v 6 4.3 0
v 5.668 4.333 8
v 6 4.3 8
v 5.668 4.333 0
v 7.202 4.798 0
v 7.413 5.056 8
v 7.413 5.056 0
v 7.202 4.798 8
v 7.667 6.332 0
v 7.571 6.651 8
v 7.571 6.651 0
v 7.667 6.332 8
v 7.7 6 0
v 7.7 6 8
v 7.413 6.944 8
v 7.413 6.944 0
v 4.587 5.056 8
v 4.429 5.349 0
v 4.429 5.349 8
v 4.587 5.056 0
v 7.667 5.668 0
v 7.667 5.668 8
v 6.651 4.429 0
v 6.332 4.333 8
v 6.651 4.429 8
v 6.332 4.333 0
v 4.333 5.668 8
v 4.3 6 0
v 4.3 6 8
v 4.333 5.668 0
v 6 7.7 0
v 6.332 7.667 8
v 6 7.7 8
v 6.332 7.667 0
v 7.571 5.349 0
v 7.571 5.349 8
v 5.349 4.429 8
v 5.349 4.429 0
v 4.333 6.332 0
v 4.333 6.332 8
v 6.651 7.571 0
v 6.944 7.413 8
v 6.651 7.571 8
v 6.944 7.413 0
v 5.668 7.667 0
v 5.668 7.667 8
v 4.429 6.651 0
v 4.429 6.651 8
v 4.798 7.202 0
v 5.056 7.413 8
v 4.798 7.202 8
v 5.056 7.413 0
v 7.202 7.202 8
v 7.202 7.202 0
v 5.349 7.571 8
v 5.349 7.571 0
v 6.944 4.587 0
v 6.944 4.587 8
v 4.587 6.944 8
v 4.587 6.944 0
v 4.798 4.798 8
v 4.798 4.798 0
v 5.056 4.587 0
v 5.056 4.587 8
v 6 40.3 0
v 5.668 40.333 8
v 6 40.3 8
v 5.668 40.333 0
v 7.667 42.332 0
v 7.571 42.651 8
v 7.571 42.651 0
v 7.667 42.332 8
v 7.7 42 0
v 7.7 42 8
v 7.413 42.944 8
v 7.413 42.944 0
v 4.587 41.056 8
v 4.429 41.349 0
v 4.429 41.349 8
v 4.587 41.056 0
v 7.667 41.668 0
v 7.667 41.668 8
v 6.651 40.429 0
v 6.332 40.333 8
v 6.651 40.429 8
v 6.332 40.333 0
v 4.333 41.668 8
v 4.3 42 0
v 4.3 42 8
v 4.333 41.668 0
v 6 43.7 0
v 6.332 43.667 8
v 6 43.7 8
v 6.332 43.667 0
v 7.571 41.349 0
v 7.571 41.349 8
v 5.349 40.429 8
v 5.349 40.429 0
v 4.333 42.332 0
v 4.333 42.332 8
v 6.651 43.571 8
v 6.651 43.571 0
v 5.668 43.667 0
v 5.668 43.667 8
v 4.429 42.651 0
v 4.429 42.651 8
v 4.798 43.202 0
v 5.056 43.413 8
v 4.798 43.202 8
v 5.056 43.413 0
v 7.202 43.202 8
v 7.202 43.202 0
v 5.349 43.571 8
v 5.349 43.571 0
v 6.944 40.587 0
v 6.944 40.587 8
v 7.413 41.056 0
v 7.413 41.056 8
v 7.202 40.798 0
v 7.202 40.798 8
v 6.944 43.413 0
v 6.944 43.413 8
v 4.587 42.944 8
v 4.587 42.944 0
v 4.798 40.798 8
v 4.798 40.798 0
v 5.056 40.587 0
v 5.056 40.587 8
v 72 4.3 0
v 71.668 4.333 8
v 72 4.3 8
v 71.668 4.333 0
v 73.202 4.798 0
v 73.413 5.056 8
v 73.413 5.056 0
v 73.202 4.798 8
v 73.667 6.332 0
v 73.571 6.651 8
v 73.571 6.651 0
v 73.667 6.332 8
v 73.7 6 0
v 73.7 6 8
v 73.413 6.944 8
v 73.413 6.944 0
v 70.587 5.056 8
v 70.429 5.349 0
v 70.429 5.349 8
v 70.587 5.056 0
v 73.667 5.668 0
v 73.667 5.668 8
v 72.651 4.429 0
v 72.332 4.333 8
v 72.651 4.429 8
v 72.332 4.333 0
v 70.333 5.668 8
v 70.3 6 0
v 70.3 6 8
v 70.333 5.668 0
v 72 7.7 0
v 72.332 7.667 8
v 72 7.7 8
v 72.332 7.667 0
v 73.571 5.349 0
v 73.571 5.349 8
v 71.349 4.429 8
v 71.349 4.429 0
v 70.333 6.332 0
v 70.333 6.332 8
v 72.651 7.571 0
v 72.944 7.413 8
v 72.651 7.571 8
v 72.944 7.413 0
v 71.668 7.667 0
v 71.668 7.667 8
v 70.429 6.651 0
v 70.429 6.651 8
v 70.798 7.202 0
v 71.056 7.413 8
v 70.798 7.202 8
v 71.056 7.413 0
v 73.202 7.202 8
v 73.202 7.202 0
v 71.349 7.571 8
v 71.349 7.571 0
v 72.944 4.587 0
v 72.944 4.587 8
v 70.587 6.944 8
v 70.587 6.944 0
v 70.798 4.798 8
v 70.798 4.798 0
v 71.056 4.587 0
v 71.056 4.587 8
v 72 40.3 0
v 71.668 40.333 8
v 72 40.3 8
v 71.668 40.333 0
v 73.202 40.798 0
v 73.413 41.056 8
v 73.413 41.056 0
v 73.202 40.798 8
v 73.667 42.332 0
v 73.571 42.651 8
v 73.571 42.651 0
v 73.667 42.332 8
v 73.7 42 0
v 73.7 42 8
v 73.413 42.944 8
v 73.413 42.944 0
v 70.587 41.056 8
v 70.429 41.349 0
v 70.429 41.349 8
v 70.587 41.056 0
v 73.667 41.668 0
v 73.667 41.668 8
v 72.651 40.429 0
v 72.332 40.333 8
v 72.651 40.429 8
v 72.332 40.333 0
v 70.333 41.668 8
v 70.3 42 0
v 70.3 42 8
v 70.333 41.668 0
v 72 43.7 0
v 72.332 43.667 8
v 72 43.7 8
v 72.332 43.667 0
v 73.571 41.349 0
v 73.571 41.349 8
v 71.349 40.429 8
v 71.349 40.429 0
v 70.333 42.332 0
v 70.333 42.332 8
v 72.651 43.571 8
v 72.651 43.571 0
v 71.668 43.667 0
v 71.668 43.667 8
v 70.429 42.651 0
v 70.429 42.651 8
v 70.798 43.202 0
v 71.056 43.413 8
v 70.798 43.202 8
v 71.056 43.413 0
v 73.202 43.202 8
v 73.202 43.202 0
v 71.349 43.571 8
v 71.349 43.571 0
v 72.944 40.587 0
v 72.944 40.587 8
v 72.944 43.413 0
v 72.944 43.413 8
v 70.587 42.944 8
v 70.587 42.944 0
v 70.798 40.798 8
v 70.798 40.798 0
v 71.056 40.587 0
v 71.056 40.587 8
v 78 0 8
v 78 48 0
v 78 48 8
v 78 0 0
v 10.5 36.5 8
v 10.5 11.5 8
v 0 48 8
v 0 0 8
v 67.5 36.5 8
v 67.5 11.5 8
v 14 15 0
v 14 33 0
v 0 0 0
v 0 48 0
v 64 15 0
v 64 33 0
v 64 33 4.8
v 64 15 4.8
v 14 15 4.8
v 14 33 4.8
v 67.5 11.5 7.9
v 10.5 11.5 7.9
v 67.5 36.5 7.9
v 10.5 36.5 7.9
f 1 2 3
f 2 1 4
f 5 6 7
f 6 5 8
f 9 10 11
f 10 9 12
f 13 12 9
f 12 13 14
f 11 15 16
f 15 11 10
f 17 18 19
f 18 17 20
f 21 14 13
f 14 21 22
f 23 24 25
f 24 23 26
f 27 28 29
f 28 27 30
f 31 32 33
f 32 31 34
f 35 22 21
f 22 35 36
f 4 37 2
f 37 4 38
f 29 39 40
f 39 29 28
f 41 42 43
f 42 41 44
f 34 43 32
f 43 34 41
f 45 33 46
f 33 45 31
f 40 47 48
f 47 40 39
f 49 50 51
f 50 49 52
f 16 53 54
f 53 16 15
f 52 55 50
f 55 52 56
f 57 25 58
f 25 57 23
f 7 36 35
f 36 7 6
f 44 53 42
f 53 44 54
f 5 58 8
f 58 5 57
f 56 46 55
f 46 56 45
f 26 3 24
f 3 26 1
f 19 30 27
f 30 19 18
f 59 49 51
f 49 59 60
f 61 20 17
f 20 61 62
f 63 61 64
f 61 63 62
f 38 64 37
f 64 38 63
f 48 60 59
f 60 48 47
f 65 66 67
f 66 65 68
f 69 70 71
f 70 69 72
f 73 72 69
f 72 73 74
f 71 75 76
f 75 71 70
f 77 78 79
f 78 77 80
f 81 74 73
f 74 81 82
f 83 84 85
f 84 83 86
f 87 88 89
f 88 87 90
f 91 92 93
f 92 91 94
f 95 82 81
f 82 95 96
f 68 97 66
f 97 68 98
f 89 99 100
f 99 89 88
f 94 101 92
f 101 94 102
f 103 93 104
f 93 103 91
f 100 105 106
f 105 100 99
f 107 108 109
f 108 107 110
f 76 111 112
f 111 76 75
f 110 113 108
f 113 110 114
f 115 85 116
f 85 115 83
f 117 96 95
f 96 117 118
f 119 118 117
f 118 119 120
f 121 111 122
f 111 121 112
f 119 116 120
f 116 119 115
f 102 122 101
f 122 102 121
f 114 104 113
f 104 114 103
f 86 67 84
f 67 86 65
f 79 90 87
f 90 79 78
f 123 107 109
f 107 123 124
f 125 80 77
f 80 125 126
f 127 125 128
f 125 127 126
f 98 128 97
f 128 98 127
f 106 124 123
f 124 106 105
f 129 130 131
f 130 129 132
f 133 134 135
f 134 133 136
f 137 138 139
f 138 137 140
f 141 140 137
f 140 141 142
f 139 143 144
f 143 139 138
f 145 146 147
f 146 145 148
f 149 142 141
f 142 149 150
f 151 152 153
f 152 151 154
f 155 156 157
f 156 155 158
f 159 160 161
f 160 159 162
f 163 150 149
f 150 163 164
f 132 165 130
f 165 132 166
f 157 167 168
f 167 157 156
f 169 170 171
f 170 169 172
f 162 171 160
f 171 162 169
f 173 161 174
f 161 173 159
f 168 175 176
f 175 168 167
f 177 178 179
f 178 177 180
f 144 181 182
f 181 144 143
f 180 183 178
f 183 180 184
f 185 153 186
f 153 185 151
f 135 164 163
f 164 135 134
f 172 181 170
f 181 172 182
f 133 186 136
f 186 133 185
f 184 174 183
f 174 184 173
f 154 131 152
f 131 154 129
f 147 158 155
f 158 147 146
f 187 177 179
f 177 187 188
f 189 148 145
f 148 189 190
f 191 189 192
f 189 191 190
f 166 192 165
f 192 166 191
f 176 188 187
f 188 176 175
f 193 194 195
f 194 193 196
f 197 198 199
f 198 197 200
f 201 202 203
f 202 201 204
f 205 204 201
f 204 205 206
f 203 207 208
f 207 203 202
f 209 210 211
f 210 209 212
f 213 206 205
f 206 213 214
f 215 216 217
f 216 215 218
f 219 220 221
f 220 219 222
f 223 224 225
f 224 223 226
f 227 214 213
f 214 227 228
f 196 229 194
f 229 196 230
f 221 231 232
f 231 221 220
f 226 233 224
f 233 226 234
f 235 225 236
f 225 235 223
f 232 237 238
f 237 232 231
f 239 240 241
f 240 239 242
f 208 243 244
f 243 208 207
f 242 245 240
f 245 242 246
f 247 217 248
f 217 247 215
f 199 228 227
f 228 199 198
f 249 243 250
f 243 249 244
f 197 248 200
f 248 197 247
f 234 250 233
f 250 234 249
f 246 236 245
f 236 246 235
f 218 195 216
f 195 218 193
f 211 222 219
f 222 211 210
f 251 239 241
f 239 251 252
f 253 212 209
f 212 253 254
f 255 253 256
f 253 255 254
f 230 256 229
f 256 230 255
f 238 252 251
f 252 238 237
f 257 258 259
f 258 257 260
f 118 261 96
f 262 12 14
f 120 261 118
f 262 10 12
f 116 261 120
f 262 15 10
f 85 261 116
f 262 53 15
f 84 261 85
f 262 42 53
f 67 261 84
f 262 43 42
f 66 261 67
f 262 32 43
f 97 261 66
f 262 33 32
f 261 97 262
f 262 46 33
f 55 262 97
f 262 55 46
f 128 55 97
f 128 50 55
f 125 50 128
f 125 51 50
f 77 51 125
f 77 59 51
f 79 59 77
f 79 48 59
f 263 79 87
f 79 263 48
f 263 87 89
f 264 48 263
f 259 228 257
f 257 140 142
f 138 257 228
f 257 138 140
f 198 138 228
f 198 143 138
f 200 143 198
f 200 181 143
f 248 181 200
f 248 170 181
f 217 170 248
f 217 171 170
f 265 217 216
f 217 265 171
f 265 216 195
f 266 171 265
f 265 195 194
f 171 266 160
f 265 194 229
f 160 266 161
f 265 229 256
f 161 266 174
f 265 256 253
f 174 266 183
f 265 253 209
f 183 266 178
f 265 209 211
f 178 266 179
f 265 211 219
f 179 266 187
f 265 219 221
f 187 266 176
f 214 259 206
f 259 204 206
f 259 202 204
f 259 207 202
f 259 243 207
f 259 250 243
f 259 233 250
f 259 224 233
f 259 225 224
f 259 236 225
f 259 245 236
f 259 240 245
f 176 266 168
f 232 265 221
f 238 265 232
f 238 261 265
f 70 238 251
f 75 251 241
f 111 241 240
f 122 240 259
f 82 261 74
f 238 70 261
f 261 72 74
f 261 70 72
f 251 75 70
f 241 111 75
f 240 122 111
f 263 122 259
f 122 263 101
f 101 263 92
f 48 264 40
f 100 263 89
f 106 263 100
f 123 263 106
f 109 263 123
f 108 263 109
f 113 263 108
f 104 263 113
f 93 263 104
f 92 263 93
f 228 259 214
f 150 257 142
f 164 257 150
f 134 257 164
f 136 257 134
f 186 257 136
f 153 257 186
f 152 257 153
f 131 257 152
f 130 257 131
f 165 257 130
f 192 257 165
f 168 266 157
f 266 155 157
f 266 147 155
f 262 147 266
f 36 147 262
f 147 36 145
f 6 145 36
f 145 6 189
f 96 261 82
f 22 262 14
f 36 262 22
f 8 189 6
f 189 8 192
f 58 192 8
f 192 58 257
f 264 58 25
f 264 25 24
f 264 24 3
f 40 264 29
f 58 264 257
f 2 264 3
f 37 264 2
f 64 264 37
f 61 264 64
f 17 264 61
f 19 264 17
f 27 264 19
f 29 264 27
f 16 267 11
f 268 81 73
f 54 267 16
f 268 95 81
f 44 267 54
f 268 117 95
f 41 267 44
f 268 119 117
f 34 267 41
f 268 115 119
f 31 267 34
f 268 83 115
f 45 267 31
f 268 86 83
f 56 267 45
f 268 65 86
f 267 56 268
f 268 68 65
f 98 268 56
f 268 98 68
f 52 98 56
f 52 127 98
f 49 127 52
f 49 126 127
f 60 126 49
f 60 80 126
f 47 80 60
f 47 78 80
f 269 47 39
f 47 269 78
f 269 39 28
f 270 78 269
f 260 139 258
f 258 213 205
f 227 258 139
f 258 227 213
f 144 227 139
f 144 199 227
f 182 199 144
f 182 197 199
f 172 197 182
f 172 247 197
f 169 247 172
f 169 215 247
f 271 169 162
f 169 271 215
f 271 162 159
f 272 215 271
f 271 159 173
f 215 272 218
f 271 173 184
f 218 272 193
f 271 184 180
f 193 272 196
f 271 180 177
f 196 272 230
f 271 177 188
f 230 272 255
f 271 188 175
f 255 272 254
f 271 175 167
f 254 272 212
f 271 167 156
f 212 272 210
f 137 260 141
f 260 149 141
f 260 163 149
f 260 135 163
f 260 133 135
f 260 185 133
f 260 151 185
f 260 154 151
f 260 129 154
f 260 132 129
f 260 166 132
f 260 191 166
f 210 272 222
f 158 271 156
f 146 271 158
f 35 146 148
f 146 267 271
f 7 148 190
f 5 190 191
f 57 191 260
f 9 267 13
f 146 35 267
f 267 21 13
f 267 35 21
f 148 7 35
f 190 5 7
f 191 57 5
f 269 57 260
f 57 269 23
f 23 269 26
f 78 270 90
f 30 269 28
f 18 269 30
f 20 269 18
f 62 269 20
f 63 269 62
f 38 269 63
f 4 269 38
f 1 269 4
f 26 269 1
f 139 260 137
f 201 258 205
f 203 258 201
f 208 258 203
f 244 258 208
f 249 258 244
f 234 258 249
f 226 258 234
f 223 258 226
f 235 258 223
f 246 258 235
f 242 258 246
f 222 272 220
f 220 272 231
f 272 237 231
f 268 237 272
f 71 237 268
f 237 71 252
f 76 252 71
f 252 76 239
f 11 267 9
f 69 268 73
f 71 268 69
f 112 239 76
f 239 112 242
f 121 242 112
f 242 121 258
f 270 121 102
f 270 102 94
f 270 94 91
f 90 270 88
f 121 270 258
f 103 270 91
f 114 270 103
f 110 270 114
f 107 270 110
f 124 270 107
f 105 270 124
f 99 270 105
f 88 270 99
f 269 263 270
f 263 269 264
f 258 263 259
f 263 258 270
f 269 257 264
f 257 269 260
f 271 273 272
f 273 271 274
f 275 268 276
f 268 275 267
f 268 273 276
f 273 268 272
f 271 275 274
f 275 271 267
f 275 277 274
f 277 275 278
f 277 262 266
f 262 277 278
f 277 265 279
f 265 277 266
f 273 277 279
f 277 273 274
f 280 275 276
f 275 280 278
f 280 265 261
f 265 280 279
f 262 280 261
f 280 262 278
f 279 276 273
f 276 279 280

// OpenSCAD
// file: params.scad
// Общие размеры первой итерации: один отсек 3.5" и детали вокруг него.
// Корпус диска — SFF-8301, таблица 3-1, класс высоты 26.10 мм (максимум).
// Положение разъёма SATA сюда не зашито: его снимают калибром gauge.scad
// с конкретного диска и только потом переносят в окно салазок.

drive_width = 101.60;
drive_height = 26.10;
drive_length = 147.00;

wall = 4.0;
floor_t = 4.0;
lip_t = 3.0;
nib = 4.0;
side_clearance = 0.8;
top_clearance = 1.5;

front_gap = 3.0;
plate_t = 8.0;
front_extra = front_gap + plate_t;

pusher_d = 4.4;
m3_clear = 3.4;
m3_pilot = 2.6;
m3_nut_af = 5.5;
m3_nut_t = 2.8;

cavity_w = drive_width + side_clearance;
outer_w = cavity_w + 2 * wall;
wall_h = drive_height + top_clearance;
body_z = drive_length + front_extra;

strap_z = 18;
strap_t = 4.0;
strap_foot = 14.0;

plate_screw_x = [14, drive_width - 14];
plate_z0 = drive_length + front_gap;
plate_screw_z = plate_z0 + plate_t / 2;
plate_bar_h = 10;
tower_w = 28;
tower_x = drive_width / 2 - tower_w / 2;

sled_w = 78;
sled_h = 48;
sled_t = 8;
sled_window_w = 50;
sled_window_h = 18;
sled_hole_inset = 6;

$fn = 32;
// main file
// Жёсткие салазки под покупной разъём SATA. Окно по центру — черновик,
// его двигать после калибра. Фаска смотрит на диск (+Z в сборке).
// Четыре отверстия M3 — к будущей каретке. Это примерка руками, не слепой стык.

include <params.scad>

module sled() {
    wx = (sled_w - sled_window_w) / 2;
    wy = (sled_h - sled_window_h) / 2;
    difference() {
        cube([sled_w, sled_h, sled_t]);
        translate([wx, wy, -0.1])
            cube([sled_window_w, sled_window_h, sled_t + 0.2]);
        hull() {
            translate([wx, wy, sled_t - 3.2])
                cube([sled_window_w, sled_window_h, 0.1]);
            translate([wx - 3.5, wy - 3.5, sled_t - 0.1])
                cube([sled_window_w + 7, sled_window_h + 7, 0.1]);
        }
        for (x = [sled_hole_inset, sled_w - sled_hole_inset]) {
            for (y = [sled_hole_inset, sled_h - sled_hole_inset]) {
                translate([x, y, -0.1])
                    cylinder(h = sled_t + 0.2, d = m3_clear);
            }
        }
    }
}

sled();
